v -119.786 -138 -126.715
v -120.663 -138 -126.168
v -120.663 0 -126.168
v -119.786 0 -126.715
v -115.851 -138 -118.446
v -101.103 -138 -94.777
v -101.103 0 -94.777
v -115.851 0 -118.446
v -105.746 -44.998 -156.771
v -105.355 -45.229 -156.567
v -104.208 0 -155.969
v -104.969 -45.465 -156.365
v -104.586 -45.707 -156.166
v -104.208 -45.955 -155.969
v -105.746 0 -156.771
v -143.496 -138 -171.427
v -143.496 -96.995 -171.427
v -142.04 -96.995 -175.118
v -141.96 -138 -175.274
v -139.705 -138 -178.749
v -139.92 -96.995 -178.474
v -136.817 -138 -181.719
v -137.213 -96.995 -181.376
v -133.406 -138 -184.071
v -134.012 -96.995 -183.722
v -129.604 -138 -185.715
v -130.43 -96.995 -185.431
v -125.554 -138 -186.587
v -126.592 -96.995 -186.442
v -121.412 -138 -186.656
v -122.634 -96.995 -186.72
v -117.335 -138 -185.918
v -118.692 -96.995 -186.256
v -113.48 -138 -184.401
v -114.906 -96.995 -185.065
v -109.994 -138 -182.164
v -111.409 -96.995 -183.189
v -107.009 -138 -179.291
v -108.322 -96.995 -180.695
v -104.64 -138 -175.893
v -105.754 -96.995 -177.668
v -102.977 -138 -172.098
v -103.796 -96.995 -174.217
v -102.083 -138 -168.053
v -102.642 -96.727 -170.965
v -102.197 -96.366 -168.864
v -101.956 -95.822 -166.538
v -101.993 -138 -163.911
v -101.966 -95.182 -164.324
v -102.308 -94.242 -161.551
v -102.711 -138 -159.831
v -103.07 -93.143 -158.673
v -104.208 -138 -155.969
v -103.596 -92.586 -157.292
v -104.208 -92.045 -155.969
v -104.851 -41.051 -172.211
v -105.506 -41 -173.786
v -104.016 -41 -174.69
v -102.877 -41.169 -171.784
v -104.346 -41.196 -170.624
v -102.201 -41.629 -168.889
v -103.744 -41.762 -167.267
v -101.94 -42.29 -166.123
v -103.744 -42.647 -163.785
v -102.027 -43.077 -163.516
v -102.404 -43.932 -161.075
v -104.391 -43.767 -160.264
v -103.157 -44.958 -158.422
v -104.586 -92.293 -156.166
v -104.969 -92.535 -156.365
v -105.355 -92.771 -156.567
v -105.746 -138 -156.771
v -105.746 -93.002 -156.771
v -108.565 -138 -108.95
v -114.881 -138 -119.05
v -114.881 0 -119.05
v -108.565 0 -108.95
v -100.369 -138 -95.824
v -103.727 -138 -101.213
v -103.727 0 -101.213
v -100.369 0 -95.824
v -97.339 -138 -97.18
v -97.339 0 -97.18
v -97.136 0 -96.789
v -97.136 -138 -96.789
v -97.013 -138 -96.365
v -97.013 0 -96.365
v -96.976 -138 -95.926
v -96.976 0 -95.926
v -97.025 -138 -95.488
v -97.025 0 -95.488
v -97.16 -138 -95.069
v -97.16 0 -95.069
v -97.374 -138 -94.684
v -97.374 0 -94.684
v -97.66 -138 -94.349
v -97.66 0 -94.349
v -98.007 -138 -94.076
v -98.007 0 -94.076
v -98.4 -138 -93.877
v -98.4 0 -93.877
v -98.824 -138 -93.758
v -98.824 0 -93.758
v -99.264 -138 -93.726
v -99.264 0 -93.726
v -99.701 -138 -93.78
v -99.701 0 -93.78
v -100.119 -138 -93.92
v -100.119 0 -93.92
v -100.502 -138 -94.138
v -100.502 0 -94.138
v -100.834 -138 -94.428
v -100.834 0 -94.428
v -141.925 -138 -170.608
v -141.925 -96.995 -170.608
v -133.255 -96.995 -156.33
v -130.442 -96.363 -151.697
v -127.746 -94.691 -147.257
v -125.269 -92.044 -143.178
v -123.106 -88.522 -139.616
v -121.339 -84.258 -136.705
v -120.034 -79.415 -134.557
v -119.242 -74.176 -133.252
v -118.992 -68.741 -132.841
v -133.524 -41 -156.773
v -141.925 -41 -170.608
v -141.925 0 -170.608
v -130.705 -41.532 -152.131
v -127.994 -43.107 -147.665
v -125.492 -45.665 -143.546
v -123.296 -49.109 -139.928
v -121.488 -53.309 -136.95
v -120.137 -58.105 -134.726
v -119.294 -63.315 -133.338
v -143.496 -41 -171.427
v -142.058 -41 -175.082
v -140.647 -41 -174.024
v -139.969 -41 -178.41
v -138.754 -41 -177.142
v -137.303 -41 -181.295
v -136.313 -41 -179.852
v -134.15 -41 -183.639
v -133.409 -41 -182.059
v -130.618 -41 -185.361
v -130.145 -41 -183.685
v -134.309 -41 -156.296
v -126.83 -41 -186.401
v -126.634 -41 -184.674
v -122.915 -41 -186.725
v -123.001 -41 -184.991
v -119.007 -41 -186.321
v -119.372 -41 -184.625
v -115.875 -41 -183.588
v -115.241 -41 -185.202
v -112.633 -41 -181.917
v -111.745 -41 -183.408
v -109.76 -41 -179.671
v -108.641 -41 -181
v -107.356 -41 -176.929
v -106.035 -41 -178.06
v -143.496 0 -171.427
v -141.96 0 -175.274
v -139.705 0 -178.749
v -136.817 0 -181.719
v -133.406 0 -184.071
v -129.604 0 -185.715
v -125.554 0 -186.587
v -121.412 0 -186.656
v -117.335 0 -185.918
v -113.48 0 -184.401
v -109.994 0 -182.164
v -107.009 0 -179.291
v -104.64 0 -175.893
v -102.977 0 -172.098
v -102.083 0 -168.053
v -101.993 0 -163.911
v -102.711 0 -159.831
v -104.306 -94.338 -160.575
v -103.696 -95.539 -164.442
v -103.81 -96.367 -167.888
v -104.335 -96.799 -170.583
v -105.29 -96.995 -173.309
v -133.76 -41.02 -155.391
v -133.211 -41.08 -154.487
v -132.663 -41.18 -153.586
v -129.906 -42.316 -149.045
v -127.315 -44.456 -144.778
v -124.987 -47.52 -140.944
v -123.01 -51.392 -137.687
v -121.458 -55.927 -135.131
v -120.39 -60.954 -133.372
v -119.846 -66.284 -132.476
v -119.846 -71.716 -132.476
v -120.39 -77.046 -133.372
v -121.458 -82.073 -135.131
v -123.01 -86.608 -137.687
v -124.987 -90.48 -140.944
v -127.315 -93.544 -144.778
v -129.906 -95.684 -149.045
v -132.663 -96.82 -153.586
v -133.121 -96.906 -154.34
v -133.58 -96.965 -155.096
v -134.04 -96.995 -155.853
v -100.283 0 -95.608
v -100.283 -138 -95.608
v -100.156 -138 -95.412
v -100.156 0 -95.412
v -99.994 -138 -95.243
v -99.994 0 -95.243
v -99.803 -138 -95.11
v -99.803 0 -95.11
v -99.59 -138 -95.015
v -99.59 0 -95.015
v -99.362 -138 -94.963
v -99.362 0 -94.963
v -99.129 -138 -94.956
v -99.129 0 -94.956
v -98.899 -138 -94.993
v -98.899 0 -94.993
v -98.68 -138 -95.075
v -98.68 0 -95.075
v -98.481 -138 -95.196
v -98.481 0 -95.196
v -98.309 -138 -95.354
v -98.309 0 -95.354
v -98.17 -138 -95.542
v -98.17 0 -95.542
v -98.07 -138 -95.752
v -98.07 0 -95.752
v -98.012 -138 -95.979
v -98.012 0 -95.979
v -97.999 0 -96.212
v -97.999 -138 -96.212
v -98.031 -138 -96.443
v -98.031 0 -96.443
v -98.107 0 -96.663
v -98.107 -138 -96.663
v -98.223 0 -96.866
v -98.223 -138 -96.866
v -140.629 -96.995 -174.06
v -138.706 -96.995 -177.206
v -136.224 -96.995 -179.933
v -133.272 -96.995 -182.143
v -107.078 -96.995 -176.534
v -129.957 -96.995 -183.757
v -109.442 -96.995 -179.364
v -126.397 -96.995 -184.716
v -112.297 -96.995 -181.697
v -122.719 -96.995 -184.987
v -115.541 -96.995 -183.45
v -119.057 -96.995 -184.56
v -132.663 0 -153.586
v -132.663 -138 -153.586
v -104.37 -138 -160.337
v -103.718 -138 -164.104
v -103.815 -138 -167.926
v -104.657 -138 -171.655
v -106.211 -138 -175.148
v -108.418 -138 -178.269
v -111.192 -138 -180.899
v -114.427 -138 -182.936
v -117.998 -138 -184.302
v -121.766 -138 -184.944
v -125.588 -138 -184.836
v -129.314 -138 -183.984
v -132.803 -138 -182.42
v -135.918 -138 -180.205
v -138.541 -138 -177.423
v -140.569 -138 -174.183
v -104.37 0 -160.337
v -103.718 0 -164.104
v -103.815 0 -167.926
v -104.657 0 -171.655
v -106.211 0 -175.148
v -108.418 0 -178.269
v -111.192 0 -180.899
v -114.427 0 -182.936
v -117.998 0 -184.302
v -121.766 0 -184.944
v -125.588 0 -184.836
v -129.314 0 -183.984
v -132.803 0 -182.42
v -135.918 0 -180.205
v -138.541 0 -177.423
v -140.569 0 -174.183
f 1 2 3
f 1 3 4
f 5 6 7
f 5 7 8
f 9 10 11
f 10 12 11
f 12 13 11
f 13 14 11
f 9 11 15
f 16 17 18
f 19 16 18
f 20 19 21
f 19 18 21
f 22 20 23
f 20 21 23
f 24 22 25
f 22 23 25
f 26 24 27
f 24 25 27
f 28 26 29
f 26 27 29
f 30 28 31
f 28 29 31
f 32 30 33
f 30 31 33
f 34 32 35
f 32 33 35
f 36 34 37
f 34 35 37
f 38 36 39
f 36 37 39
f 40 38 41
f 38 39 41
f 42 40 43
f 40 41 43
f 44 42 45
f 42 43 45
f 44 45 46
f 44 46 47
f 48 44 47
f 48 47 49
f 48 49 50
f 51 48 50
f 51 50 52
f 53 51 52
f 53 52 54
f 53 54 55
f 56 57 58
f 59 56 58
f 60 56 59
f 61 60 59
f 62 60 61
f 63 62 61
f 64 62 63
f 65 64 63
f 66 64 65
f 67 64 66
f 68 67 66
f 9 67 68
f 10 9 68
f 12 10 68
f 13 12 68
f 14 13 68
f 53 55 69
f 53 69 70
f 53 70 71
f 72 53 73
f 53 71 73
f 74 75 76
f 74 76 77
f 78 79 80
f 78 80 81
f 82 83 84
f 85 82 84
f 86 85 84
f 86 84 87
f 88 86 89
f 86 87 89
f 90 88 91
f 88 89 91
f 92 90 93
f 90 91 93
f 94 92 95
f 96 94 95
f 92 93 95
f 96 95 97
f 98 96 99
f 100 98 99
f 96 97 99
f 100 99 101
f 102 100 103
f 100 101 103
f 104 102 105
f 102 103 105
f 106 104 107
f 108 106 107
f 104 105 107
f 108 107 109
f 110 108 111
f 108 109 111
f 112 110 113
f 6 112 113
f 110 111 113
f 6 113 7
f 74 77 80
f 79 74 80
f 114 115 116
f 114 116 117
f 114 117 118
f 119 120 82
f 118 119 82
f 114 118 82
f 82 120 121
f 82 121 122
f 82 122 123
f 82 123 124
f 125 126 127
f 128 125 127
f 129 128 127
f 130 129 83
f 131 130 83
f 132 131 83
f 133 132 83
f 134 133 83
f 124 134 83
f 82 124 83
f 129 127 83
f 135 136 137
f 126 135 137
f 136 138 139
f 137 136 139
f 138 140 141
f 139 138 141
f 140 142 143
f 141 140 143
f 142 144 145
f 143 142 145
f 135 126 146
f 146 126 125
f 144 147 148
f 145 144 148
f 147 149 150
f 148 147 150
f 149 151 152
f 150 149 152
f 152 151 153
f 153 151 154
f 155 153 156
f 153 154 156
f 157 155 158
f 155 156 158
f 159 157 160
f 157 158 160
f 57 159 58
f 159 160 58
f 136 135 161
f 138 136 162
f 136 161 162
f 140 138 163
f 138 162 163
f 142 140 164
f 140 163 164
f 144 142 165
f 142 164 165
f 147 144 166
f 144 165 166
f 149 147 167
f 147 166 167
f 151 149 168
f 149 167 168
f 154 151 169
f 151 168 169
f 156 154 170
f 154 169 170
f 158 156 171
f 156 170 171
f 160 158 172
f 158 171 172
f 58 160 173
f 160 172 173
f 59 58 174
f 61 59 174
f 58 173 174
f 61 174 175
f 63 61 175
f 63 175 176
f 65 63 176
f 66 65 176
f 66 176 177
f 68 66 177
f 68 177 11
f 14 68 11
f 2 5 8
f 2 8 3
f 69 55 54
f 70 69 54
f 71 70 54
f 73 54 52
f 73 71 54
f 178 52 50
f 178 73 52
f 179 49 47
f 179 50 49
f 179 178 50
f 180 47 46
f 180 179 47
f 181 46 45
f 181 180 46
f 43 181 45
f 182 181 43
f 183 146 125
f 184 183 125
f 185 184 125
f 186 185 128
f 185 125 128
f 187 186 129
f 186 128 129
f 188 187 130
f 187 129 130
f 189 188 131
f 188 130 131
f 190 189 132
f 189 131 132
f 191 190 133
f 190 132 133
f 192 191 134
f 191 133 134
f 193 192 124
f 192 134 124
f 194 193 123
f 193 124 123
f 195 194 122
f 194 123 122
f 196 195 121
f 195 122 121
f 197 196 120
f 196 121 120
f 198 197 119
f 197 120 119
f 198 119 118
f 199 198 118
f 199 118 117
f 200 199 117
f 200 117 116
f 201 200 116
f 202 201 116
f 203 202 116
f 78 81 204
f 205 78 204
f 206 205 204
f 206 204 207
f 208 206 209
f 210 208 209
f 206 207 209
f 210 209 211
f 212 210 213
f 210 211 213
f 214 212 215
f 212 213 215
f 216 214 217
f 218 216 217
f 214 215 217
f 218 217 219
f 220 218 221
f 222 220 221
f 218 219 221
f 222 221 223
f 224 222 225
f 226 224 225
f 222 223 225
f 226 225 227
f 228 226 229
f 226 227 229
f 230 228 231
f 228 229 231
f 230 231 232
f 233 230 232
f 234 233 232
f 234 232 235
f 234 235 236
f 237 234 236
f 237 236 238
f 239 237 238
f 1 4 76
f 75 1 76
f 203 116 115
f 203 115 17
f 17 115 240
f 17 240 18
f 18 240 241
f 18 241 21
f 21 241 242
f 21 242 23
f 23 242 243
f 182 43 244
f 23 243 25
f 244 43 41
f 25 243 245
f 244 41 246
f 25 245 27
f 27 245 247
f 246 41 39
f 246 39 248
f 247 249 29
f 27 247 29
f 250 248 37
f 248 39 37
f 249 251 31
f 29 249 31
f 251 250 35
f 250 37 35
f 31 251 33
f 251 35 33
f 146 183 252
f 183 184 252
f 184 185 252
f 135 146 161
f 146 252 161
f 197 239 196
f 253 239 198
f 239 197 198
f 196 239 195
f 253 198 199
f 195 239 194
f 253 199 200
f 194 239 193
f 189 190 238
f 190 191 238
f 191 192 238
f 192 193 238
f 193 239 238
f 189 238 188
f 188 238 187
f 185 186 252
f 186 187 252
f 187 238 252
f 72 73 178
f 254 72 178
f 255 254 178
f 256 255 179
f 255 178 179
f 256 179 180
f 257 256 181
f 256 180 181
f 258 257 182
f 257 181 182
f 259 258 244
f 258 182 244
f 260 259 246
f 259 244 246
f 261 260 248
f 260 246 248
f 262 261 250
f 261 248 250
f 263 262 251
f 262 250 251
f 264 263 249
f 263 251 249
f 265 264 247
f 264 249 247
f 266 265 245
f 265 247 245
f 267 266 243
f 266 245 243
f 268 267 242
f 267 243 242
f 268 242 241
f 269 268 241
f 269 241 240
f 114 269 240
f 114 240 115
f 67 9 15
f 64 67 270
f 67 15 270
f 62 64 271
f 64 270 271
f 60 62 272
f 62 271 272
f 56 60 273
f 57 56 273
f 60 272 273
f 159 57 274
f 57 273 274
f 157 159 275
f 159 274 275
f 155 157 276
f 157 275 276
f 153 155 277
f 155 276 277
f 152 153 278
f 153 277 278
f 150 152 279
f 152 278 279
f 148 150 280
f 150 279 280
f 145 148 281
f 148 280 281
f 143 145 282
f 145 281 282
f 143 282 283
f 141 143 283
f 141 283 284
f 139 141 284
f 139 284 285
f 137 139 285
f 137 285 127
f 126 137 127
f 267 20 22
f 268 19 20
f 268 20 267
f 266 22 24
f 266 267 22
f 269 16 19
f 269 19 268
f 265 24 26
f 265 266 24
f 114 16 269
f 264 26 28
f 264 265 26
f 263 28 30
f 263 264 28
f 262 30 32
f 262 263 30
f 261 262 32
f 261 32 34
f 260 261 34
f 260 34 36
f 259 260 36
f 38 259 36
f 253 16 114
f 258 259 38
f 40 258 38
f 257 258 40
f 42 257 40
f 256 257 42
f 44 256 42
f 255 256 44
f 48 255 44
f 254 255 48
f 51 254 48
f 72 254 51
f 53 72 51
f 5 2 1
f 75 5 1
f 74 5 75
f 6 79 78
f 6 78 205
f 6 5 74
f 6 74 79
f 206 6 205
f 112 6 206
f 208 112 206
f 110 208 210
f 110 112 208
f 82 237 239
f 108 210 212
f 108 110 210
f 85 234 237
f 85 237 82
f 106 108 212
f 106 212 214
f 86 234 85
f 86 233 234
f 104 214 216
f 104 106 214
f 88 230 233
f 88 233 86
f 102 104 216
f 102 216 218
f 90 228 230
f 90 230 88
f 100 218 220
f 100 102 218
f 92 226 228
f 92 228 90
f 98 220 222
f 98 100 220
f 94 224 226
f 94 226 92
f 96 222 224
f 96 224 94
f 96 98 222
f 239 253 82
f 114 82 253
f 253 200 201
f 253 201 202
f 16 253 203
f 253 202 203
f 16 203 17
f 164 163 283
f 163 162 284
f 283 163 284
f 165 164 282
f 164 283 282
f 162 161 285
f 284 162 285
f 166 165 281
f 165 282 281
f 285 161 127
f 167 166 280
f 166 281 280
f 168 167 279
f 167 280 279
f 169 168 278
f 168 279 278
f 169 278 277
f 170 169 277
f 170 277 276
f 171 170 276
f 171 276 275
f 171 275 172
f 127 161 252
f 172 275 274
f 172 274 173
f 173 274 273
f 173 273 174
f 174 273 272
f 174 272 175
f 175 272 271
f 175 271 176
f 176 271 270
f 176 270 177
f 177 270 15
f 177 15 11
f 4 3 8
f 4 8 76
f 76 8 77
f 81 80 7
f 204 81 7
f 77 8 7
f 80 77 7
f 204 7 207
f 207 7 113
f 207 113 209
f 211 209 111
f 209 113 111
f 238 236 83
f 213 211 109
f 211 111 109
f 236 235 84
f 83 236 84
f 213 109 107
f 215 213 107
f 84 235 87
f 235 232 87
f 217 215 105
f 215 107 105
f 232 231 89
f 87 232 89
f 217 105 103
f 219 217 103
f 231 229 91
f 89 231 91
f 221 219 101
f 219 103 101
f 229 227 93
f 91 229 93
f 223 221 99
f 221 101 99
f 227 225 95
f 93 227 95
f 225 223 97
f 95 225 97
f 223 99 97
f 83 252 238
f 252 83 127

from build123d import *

# Parameters (mm, degrees)
F1_DEPTH = 138
F3_DEPTH = 49.4
F4_DEPTH = 78.6
F5_DEPTH = 25
F6_DEPTH = 25


with BuildPart() as f1:
    # F0 (on Front) → F1 (new body)
    with BuildSketch(Plane.XZ):
        with BuildLine():
            Line((-103.7269789477, -101.2127594065), (-100.3693379844, -95.8242133885))
            ThreePointArc((-100.3693379844, -95.8242133885), (-98.6798878596, -95.0745691606), (-98.2234282886, -96.8656171367))
            Line((-98.2234282886, -96.8656171367), (-132.6634080078, -153.5856345004))
            Line((-132.6634080078, -153.5856345004), (-143.4963060892, -171.4265906301))
            ThreePointArc((-143.4963060892, -171.4265906301), (-115.3707222455, -185.2538928172), (-104.207857368, -155.9685176268))
            Line((-104.207857368, -155.9685176268), (-105.7457237491, -156.770518844))
            ThreePointArc((-105.7457237491, -156.770518844), (-116.1787188571, -183.7071763743), (-141.9245898724, -170.6082820892))
            Line((-141.9245898724, -170.6082820892), (-97.3392441446, -97.179621432))
            ThreePointArc((-97.3392441446, -97.179621432), (-98.0067171309, -94.0759095516), (-101.1029781127, -94.7771338786))
            Line((-101.1029781127, -94.7771338786), (-115.8510804718, -118.4457837165))
            Line((-115.8510804718, -118.4457837165), (-120.663074613, -126.1683639899))
            Line((-120.663074613, -126.1683639899), (-119.7859828694, -126.7148860308))
            Line((-119.7859828694, -126.7148860308), (-114.8806803328, -119.0504468754))
            Line((-114.8806803328, -119.0504468754), (-108.5651855266, -108.950317898))
            Line((-108.5651855266, -108.950317898), (-103.7269789477, -101.2127594065))
        make_face()
    extrude(amount=F1_DEPTH)

    # F2 (on face) → F3 (cut)
    with BuildSketch(Plane(origin=(-28.0068430021, 0, 17.0055502417), x_dir=(0, 1, 0), z_dir=(0.8547686199, 0, -0.5190092546))):
        with BuildLine():
            Line((-41, -219.4907814326), (-41, -203.3049017191))
            ThreePointArc((-41, -203.3049017191), (-68.7405162983, -175.3061040983), (-96.9951905863, -202.7859566013))
            Line((-96.9951905863, -202.7859566013), (-96.9951905863, -203.8238468369))
            Line((-96.9951905863, -203.8238468369), (-96.9951905863, -219.4907814326))
            Line((-96.9951905863, -219.4907814326), (-41, -219.4907814326))
        make_face()
    extrude(amount=F3_DEPTH, mode=Mode.SUBTRACT)

    # F2 (on face) → F4 (cut)
    with BuildSketch(Plane(origin=(-28.0068430021, 0, 17.0055502417), x_dir=(0, 1, 0), z_dir=(0.8547686199, 0, -0.5190092546))):
        Polygon((-41, -251.147121191), (-41, -219.4907814326), (-96.9951905863, -219.4907814326), (-96.9951905863, -251.147121191), (-42.3506498337, -251.147121191), align=None)
    extrude(amount=F4_DEPTH, mode=Mode.SUBTRACT)

    # F2 (on face) → F5 (cut)
    with BuildSketch(Plane(origin=(-28.0068430021, 0, 17.0055502417), x_dir=(0, 1, 0), z_dir=(0.8547686199, 0, -0.5190092546))):
        with BuildLine():
            Line((-41, -219.4907814326), (-41, -203.3049017191))
            ThreePointArc((-41, -203.3049017191), (-68.7405162983, -175.3061040983), (-96.9951905863, -202.7859566013))
            Line((-96.9951905863, -202.7859566013), (-96.9951905863, -203.8238468369))
            Line((-96.9951905863, -203.8238468369), (-96.9951905863, -219.4907814326))
            Line((-96.9951905863, -219.4907814326), (-41, -219.4907814326))
        make_face()
    extrude(amount=-F5_DEPTH, mode=Mode.SUBTRACT)

    # F2 (on face) → F6 (cut)
    with BuildSketch(Plane(origin=(-28.0068430021, 0, 17.0055502417), x_dir=(0, 1, 0), z_dir=(0.8547686199, 0, -0.5190092546))):
        Polygon((-41, -251.147121191), (-41, -219.4907814326), (-96.9951905863, -219.4907814326), (-96.9951905863, -251.147121191), (-42.3506498337, -251.147121191), align=None)
    extrude(amount=-F6_DEPTH, mode=Mode.SUBTRACT)


solid = f1.part
